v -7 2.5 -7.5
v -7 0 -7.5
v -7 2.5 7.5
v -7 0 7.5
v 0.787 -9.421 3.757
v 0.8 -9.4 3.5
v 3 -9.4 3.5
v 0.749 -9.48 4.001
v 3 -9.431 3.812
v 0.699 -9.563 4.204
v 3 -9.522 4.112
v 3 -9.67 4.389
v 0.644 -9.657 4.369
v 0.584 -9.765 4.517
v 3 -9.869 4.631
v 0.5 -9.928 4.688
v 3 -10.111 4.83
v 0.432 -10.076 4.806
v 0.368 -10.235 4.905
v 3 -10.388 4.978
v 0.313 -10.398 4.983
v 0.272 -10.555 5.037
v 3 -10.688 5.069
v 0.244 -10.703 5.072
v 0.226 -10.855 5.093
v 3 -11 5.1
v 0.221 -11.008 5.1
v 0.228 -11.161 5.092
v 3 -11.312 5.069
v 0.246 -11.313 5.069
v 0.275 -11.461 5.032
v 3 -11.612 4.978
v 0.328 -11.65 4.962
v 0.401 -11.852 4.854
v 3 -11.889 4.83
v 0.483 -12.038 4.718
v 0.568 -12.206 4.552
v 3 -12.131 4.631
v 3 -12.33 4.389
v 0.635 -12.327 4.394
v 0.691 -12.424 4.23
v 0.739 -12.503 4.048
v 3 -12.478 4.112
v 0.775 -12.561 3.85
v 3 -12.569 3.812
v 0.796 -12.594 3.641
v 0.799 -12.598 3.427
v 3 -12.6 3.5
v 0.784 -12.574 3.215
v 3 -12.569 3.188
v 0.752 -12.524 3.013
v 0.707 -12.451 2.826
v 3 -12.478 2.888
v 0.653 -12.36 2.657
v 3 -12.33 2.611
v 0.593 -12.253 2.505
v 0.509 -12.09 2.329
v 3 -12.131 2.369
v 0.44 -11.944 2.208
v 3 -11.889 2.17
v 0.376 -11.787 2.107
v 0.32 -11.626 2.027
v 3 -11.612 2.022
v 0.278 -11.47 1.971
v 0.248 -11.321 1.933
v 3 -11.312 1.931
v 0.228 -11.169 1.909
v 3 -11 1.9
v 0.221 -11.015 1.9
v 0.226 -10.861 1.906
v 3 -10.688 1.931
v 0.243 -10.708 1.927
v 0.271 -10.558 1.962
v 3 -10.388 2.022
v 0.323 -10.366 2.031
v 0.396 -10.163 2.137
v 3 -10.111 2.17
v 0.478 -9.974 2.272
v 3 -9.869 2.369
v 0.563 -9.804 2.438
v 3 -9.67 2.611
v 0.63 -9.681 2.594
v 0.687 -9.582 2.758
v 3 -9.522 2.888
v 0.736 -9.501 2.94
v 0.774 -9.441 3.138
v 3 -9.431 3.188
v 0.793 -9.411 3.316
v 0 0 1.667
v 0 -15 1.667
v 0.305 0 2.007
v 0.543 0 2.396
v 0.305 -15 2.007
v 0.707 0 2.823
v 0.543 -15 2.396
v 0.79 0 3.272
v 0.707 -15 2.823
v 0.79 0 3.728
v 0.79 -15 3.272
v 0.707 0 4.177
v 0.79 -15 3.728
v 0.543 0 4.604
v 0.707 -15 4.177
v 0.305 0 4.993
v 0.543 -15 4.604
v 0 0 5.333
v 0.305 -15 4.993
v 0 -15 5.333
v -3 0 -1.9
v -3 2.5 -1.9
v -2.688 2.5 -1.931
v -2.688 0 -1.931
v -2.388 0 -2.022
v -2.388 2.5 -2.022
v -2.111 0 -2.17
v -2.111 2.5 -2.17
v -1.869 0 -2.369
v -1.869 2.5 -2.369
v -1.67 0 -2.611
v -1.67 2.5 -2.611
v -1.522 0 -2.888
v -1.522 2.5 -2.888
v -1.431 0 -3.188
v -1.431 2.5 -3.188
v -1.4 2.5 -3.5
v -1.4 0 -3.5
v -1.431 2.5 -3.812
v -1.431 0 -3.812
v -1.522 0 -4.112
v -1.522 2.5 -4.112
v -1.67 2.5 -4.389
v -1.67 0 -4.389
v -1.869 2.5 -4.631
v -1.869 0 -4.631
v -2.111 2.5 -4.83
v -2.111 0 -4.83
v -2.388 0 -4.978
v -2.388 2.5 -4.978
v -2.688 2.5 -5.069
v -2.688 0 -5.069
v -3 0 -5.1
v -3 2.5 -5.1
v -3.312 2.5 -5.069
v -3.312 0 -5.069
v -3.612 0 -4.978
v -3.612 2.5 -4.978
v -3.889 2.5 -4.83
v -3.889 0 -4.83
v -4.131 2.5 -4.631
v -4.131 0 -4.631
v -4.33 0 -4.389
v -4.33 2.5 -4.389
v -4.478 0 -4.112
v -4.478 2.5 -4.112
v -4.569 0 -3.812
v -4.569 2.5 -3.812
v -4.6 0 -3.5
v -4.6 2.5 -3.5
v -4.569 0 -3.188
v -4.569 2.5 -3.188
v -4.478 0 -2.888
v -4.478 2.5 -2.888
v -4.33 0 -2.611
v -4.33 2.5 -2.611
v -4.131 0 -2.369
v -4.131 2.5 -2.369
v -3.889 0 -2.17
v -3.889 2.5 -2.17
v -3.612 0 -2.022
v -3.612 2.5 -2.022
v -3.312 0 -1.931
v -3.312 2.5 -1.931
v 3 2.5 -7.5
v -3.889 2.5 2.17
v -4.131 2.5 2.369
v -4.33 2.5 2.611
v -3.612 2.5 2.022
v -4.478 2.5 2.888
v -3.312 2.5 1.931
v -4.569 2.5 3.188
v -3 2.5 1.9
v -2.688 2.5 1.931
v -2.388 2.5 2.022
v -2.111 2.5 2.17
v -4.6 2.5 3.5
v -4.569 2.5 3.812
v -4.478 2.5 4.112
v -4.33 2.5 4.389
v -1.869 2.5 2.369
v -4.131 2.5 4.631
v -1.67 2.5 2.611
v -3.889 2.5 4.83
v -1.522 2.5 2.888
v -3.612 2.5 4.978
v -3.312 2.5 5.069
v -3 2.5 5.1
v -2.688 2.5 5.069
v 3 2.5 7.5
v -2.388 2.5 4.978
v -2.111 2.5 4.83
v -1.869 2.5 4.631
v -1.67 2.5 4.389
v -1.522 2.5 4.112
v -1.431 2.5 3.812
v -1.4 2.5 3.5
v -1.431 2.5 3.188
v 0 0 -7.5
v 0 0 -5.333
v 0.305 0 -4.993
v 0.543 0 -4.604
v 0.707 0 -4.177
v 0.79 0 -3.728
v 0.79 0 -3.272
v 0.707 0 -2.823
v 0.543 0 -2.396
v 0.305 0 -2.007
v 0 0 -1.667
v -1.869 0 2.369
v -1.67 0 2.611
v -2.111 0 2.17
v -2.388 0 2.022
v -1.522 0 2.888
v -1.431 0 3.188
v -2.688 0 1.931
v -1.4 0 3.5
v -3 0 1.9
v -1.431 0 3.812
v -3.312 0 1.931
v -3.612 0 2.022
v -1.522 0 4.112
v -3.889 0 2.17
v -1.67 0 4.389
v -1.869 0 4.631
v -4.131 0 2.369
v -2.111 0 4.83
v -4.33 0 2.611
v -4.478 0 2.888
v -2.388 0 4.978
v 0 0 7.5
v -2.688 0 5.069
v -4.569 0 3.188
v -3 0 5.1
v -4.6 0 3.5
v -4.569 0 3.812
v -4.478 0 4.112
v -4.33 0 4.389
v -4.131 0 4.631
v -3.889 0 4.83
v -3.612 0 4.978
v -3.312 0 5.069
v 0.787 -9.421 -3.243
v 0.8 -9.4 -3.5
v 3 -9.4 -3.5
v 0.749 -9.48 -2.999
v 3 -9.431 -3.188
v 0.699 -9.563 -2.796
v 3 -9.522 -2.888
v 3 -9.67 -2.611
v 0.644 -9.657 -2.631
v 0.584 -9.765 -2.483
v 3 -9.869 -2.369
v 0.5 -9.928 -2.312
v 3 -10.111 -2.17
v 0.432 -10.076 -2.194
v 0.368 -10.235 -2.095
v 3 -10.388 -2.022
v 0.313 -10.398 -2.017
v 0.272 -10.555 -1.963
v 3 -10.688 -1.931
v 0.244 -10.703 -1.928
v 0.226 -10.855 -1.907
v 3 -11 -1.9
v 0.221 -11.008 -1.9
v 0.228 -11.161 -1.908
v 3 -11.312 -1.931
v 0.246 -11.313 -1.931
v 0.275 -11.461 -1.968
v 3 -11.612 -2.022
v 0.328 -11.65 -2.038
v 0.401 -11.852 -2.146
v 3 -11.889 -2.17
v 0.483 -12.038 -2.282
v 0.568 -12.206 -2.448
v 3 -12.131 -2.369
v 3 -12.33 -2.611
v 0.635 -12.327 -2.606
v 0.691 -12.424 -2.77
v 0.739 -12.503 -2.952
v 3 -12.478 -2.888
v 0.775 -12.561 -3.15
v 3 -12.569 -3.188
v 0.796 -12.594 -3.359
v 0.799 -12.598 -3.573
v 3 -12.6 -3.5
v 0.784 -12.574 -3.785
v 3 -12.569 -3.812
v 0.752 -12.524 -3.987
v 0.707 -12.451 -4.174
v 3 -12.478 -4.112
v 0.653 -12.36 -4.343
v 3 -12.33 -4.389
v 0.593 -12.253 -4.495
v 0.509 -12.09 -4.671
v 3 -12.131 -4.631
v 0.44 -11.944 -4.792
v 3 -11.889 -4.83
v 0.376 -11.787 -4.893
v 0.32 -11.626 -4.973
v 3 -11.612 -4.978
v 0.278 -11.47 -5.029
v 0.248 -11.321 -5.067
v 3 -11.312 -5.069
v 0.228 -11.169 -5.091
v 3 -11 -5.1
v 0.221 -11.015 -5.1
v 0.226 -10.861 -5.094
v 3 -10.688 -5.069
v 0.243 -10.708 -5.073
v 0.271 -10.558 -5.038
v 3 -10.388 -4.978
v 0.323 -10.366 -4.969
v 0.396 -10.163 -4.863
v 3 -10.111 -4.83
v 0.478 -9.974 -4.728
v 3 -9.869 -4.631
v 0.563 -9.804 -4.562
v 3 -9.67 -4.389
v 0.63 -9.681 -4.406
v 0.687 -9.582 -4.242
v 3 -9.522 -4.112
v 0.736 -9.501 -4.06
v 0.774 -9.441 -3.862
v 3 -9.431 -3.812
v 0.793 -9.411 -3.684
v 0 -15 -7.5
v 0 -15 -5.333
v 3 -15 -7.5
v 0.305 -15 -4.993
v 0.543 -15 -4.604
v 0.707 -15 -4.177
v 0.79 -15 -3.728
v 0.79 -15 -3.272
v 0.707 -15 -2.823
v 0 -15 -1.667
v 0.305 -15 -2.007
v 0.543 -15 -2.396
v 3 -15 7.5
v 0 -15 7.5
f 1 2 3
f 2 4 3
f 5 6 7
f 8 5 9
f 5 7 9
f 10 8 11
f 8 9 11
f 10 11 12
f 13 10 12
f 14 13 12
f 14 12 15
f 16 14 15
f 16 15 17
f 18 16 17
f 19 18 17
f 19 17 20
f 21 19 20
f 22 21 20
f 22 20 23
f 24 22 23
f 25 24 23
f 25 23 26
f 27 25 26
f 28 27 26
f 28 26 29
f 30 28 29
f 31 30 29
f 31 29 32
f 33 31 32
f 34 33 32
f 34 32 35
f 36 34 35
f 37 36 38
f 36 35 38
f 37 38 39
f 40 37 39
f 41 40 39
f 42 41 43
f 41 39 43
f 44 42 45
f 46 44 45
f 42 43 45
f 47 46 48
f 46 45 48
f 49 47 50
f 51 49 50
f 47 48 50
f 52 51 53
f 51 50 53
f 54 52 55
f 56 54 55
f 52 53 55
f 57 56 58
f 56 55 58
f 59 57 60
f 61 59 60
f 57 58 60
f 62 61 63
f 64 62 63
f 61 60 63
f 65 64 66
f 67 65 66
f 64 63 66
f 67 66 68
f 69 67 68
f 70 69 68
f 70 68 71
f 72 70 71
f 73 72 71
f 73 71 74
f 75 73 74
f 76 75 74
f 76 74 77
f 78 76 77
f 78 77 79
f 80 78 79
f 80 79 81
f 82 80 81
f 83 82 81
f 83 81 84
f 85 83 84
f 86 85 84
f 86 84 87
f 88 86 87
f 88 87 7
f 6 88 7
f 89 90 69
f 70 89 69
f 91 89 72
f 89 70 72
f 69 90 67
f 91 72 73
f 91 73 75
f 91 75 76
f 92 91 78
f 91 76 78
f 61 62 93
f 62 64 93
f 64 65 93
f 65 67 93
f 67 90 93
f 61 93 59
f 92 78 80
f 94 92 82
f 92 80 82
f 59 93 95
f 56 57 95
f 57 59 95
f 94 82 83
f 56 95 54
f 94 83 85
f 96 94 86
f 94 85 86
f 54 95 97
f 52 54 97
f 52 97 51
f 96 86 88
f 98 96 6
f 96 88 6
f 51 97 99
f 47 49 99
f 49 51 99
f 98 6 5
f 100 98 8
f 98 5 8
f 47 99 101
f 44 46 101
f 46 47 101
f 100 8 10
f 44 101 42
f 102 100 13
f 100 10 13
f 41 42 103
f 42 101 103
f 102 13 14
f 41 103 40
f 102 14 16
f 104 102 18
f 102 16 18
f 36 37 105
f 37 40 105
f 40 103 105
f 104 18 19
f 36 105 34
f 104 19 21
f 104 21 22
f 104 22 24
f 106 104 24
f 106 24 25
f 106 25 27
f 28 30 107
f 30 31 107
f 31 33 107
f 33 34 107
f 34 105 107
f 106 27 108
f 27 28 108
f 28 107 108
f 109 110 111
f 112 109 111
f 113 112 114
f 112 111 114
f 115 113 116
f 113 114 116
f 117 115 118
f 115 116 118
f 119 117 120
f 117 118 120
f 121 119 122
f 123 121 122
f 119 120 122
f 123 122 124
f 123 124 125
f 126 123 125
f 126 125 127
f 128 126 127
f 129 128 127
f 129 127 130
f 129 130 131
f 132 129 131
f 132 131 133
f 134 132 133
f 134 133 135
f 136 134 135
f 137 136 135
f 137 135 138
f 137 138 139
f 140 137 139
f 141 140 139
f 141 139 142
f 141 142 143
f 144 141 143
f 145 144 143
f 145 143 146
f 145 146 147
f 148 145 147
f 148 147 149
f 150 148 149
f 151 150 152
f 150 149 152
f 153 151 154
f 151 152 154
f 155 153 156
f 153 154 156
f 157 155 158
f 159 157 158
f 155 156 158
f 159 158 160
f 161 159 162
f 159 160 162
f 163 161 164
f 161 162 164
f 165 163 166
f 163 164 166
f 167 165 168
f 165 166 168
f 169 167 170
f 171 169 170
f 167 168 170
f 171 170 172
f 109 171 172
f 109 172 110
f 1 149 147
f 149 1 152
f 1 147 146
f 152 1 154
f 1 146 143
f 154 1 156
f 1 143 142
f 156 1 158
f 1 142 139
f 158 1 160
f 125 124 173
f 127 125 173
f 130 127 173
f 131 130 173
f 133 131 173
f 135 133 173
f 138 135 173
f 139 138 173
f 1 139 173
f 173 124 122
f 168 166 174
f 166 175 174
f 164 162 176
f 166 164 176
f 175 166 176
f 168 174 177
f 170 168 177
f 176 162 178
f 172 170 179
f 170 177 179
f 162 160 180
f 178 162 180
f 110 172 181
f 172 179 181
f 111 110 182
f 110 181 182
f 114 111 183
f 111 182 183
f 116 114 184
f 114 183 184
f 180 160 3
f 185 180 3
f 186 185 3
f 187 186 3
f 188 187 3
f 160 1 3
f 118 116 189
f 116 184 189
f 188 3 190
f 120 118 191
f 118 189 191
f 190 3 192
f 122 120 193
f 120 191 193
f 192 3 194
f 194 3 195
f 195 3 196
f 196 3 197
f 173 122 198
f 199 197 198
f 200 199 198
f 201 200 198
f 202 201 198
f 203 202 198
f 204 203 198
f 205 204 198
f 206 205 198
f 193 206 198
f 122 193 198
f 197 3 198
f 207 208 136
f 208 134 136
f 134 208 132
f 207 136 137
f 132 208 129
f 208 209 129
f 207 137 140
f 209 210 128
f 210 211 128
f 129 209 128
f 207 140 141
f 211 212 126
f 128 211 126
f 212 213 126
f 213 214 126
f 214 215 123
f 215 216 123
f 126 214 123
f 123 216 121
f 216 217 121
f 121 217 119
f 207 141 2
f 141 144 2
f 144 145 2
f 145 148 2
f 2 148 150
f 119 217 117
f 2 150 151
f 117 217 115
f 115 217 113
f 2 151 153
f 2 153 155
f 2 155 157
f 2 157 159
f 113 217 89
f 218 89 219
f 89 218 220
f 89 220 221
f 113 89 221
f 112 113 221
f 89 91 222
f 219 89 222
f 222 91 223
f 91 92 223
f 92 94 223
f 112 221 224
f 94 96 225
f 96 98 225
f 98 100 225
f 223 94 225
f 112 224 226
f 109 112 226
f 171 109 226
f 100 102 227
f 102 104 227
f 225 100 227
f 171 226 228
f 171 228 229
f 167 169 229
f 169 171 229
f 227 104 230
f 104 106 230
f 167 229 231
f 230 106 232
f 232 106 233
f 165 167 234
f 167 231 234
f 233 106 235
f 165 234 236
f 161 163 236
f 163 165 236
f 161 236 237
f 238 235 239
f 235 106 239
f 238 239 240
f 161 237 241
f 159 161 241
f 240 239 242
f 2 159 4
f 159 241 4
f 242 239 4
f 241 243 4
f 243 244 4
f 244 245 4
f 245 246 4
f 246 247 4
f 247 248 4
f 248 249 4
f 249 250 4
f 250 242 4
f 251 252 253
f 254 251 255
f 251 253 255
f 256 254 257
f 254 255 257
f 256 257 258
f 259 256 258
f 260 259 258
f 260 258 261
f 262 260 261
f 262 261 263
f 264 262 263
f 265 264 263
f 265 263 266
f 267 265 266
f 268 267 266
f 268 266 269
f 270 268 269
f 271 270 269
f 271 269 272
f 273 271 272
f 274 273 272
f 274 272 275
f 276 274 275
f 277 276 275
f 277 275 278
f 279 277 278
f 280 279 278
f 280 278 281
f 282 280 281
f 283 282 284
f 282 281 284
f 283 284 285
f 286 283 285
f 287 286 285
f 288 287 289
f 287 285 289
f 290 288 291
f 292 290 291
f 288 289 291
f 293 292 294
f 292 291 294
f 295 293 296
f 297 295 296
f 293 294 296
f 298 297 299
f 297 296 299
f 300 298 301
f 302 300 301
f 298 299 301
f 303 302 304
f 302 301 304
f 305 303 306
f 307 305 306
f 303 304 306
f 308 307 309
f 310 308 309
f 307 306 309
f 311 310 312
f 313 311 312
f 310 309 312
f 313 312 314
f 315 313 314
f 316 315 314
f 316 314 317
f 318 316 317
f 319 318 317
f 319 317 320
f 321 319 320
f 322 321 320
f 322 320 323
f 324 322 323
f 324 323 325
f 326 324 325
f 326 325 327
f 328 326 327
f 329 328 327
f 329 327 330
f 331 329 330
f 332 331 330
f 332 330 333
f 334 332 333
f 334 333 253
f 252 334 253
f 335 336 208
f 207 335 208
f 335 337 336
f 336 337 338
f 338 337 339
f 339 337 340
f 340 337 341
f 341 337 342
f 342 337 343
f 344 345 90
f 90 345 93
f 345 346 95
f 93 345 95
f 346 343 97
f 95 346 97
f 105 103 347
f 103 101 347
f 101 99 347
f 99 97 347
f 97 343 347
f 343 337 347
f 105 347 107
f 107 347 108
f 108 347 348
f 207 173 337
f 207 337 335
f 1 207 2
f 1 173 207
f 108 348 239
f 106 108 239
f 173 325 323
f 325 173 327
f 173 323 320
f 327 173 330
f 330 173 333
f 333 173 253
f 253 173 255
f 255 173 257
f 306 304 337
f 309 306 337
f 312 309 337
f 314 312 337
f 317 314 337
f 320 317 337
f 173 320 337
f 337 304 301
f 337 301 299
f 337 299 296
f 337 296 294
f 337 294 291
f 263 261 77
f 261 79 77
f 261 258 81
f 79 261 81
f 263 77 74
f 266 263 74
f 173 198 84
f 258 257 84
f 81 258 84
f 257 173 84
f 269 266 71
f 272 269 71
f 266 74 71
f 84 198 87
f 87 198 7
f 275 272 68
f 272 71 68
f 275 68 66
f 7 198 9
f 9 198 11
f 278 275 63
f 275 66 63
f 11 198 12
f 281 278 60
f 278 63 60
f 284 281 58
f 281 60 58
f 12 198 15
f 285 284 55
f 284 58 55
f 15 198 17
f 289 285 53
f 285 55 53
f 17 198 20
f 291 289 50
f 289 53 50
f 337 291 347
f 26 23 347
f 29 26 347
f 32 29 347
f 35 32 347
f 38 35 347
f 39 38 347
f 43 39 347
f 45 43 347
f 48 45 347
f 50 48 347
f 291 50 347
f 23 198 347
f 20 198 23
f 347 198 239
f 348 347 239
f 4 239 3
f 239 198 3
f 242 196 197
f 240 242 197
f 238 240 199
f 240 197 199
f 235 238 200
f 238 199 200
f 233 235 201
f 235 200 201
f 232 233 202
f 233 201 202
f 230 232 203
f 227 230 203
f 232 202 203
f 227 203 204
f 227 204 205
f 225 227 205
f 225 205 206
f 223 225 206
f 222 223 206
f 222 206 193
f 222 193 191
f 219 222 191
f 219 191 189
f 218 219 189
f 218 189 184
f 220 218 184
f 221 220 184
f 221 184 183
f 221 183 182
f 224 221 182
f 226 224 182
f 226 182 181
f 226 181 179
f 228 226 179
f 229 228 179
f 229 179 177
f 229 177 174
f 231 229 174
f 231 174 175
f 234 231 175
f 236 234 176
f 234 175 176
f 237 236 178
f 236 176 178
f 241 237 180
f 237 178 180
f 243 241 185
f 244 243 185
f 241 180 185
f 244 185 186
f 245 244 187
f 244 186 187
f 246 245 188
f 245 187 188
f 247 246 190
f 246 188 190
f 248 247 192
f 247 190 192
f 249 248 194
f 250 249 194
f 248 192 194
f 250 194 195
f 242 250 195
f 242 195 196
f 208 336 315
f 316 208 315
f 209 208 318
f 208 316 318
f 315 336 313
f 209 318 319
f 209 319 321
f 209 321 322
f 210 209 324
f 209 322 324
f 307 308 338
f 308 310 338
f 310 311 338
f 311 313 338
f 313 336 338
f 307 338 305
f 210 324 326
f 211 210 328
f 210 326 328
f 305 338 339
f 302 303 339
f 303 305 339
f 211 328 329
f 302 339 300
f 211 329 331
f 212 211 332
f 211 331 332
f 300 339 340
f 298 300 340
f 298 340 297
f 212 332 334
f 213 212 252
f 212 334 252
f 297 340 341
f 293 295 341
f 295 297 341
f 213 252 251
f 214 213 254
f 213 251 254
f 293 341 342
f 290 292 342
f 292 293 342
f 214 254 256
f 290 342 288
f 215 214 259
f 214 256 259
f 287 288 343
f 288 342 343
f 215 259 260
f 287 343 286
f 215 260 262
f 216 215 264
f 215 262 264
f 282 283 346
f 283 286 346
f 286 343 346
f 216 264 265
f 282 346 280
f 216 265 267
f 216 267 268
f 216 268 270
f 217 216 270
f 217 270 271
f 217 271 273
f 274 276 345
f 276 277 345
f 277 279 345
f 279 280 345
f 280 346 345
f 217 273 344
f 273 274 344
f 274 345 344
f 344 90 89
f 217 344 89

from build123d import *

# Parameters (mm, degrees)
BOSS_EXTRUDE1_DEPTH = 7.5
SKETCH2_R           = 1.6
CUT_EXTRUDE1_DEPTH  = 15
SKETCH3_R           = 1.6
CUT_EXTRUDE2_DEPTH  = 15
SKETCH4_R           = 2.5
CUT_EXTRUDE3_DEPTH  = 15


with BuildPart() as part:
    # Sketch1 → Boss-Extrude1 (new, symmetric)
    with BuildSketch(Plane.XY):
        Polygon((0, 0), (-7, 0), (-7, 2.5), (3, 2.5), (3, -15), (0, -15), align=None)
    extrude(amount=BOSS_EXTRUDE1_DEPTH, both=True)

    # Sketch2 → Cut-Extrude1 (cut)
    with BuildSketch(Plane(origin=(0, 2.5, 0), x_dir=(1, 0, 0), z_dir=(0, 1, 0))):
        with Locations(Location((-3, 3.5, 0), (0, 0, 270))):
            Circle(SKETCH2_R)
        with Locations(Location((-3, -3.5, 0), (0, 0, 270))):
            Circle(SKETCH2_R)
    extrude(amount=-CUT_EXTRUDE1_DEPTH, mode=Mode.SUBTRACT)

    # Sketch3 → Cut-Extrude2 (cut)
    with BuildSketch(Plane(origin=(3, 0, 0), x_dir=(0, 0, -1), z_dir=(1, 0, 0))):
        with Locations(Location((3.5, -11, 0), (0, 0, 90))):
            Circle(SKETCH3_R)
        with Locations(Location((-3.5, -11, 0), (0, 0, 90))):
            Circle(SKETCH3_R)
    extrude(amount=-CUT_EXTRUDE2_DEPTH, mode=Mode.SUBTRACT)

    # Sketch4 → Cut-Extrude3 (cut)
    with BuildSketch(Plane.XZ.offset(15)):
        with Locations((-1.7, 3.5)):
            Circle(SKETCH4_R)
        with Locations((-1.7, -3.5)):
            Circle(SKETCH4_R)
    extrude(amount=-CUT_EXTRUDE3_DEPTH, mode=Mode.SUBTRACT)


solid = part.part
